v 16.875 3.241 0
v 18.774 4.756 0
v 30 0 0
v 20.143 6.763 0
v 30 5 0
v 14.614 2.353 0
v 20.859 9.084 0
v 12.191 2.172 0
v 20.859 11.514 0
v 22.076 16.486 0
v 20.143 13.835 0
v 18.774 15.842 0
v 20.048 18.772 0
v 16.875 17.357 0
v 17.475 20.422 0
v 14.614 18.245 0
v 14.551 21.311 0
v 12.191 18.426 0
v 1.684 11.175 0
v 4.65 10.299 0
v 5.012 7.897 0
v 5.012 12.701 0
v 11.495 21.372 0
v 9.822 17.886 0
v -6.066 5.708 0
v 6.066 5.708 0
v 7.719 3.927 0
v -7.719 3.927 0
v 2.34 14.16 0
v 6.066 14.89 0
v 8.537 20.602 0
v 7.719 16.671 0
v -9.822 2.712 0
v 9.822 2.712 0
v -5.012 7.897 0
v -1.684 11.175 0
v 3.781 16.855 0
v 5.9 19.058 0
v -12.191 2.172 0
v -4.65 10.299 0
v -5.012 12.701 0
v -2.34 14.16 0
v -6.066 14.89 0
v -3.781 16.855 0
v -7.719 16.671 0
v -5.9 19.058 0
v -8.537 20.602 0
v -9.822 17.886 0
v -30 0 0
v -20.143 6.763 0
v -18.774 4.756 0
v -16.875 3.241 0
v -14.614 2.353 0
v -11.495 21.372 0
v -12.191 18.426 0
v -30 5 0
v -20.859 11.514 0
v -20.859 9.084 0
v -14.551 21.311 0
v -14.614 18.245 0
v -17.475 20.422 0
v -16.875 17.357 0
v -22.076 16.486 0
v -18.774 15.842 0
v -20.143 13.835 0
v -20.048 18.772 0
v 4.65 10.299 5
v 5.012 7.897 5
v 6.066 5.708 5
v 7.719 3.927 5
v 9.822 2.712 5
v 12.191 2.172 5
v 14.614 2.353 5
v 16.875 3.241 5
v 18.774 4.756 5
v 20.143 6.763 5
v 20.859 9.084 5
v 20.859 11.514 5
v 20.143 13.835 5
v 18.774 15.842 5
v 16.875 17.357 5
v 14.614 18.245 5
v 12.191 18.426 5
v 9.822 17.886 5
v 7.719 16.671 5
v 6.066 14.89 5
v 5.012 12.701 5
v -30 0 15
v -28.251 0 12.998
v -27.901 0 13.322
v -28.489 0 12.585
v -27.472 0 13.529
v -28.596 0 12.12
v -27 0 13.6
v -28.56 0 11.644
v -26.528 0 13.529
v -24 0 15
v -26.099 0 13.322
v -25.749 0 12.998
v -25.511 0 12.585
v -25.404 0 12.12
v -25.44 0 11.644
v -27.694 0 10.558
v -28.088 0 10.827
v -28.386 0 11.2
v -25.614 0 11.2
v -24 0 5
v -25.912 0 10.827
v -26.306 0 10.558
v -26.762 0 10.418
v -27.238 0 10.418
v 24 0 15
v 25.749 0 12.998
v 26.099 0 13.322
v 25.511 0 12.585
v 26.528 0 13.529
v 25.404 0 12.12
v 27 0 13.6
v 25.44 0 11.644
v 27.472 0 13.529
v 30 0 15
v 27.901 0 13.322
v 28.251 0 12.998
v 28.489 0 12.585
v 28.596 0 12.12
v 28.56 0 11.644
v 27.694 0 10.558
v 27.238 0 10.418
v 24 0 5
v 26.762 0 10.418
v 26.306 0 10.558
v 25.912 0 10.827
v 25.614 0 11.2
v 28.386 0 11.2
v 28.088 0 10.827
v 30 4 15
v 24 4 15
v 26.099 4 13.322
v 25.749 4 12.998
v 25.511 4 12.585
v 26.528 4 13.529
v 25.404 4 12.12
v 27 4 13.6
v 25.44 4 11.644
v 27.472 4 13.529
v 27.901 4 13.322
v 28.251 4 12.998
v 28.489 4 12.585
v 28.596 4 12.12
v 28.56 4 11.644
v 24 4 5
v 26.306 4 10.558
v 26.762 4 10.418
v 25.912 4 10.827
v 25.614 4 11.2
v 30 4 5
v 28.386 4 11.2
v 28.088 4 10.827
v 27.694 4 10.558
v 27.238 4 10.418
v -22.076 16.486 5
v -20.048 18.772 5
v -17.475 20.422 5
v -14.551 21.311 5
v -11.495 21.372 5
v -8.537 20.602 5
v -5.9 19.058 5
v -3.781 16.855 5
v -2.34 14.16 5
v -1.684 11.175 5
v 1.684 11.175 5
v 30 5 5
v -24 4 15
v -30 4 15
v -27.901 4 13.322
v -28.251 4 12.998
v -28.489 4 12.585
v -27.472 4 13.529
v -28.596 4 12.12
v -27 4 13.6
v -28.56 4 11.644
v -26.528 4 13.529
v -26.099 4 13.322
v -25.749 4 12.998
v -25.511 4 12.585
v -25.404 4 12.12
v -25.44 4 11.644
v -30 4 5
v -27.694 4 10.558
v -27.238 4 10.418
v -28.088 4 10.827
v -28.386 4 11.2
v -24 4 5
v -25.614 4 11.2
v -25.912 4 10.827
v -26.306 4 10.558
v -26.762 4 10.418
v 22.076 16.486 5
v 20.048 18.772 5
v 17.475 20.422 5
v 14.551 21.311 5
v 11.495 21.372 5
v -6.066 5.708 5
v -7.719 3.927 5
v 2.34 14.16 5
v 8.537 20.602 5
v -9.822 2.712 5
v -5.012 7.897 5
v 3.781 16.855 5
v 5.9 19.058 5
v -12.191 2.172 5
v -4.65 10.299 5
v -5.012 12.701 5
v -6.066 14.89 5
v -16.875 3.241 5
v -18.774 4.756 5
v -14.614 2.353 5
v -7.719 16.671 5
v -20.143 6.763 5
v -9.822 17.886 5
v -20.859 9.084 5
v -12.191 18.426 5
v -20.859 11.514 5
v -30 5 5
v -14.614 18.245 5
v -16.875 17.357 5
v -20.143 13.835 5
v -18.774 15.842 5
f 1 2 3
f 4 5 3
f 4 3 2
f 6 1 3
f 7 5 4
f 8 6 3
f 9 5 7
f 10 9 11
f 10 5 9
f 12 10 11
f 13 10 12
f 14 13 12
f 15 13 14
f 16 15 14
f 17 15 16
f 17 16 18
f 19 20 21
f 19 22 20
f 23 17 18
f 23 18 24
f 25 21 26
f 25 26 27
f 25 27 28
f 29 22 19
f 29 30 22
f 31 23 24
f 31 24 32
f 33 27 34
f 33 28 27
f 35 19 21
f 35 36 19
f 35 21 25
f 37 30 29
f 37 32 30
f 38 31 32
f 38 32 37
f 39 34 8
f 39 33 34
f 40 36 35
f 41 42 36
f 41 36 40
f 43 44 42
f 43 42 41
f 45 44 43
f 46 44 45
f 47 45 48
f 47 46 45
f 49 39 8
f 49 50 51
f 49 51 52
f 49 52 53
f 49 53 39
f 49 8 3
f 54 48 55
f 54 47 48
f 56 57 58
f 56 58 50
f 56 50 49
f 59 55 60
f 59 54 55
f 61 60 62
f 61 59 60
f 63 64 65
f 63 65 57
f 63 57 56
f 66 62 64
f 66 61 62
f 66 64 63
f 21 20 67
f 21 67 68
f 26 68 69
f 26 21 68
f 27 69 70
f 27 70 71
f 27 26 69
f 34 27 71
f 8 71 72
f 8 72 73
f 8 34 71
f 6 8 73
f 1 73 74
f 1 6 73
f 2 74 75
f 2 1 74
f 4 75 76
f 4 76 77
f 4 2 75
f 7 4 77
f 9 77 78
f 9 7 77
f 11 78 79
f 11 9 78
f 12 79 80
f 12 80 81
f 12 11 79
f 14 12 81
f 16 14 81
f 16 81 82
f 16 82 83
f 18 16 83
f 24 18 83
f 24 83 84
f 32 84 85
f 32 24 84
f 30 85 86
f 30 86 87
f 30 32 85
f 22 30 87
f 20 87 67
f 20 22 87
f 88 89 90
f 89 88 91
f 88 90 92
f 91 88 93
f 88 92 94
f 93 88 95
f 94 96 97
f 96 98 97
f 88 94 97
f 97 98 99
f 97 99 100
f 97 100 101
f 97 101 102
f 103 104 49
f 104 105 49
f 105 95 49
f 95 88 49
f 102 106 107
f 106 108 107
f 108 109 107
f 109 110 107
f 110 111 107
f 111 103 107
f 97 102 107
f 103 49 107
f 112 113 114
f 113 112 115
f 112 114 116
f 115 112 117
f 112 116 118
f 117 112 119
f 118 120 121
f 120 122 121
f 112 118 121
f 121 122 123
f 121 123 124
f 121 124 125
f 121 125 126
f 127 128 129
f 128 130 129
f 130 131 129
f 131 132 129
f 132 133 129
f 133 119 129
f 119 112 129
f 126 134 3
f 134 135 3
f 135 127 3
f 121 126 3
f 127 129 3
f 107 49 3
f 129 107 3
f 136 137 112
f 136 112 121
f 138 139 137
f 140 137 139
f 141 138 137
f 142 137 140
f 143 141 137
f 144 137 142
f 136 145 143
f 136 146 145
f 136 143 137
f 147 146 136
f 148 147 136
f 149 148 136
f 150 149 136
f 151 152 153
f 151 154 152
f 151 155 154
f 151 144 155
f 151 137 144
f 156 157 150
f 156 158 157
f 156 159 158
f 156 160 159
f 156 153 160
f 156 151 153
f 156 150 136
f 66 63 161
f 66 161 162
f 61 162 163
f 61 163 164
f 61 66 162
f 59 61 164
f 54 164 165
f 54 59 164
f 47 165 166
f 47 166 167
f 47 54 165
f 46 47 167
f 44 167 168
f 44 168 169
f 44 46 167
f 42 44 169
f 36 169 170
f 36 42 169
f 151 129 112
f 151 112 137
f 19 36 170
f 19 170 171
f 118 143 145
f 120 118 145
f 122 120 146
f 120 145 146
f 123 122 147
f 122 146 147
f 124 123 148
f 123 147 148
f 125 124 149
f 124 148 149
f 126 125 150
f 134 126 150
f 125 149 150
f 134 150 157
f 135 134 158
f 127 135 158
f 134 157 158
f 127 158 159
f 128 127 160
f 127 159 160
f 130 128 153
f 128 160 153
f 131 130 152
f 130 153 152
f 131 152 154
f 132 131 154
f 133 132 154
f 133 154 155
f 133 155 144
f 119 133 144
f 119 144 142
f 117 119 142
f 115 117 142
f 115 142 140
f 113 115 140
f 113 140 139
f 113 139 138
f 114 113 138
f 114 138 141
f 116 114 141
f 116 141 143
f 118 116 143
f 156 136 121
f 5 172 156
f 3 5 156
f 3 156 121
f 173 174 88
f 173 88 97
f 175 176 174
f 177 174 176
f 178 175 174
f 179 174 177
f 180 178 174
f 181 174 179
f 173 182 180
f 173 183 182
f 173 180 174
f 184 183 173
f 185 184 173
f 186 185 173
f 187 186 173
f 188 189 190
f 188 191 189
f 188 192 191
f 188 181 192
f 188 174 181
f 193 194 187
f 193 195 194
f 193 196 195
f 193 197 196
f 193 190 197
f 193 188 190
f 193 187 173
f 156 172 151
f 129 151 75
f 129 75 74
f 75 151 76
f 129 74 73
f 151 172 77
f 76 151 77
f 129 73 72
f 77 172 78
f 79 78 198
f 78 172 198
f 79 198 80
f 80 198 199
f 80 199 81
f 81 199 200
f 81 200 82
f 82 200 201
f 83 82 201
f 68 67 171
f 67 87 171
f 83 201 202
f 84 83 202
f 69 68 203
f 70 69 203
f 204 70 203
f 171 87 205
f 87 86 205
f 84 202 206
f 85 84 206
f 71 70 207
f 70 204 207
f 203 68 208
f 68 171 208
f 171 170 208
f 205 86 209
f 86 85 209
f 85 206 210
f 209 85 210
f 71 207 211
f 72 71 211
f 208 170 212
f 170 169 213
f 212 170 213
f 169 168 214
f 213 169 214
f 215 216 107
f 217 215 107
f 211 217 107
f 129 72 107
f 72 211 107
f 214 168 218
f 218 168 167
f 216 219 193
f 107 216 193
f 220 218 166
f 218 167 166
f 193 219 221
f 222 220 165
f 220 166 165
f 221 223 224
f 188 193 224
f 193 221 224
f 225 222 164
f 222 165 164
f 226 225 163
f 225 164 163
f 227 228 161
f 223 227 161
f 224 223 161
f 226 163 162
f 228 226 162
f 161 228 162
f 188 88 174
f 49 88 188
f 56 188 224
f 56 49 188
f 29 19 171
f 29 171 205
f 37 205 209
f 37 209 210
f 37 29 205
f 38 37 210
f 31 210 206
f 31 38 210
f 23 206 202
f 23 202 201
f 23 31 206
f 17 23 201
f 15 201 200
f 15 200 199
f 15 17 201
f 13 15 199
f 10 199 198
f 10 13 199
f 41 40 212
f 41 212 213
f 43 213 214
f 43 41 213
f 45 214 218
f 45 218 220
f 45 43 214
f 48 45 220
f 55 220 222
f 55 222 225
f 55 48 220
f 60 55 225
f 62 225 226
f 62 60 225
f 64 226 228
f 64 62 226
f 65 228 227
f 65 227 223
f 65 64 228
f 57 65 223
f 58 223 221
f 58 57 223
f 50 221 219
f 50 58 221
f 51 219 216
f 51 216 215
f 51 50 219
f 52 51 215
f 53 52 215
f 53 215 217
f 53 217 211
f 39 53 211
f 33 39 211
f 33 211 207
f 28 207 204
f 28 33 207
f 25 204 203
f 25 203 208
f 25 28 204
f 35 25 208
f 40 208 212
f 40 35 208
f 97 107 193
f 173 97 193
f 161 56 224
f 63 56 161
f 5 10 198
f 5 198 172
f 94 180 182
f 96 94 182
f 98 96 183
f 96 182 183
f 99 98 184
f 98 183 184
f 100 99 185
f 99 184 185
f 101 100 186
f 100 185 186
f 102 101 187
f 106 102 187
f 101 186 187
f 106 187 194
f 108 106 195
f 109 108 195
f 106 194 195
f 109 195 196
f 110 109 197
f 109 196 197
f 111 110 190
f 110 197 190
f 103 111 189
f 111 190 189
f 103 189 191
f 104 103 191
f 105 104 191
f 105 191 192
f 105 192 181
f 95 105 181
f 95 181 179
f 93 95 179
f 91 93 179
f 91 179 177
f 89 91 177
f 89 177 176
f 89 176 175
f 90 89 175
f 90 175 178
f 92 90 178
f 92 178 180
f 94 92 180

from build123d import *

# Parameters (mm, degrees)
SKETCH1_R           = 8.15
BOSS_EXTRUDE1_DEPTH = 5
SKETCH3_W           = 6
SKETCH3_H           = 4
BOSS_EXTRUDE2_DEPTH = 10
SKETCH4_R           = 1.6
CUT_EXTRUDE1_DEPTH  = 10


with BuildPart() as part:
    # Sketch1 → Boss-Extrude1 (new body)
    with BuildSketch(Plane.XY):
        with BuildLine():
            Line((30, 0), (-30, 0))
            Line((-30, 0), (-30, 5))
            Line((-30, 5), (-22.076055104, 16.485922475))
            ThreePointArc((-22.076055104, 16.485922475), (-9.989658142, 21.089074765), (-1.684442299, 11.174772352))
            Line((-1.684442299, 11.174772352), (1.684442299, 11.174772352))
            ThreePointArc((1.684442299, 11.174772352), (9.989658142, 21.089074765), (22.076055104, 16.485922475))
            Line((22.076055104, 16.485922475), (30, 5))
            Line((30, 5), (30, 0))
        make_face()
        with Locations((-12.8, 10.299057219)):
            Circle(SKETCH1_R, mode=Mode.SUBTRACT)
        with Locations(Location((12.8, 10.299057219, 0), (0, 0, 180))):
            Circle(SKETCH1_R, mode=Mode.SUBTRACT)
    extrude(amount=BOSS_EXTRUDE1_DEPTH)

    # Sketch3 → Boss-Extrude2 (add)
    with BuildSketch(Plane.XY.offset(5)):
        with Locations((-27, 2)):
            Rectangle(SKETCH3_W, SKETCH3_H)
        with Locations((27, 2)):
            Rectangle(SKETCH3_W, SKETCH3_H)
    extrude(amount=BOSS_EXTRUDE2_DEPTH)

    # Sketch4 → Cut-Extrude1 (cut)
    with BuildSketch(Plane(origin=(0, 4, 0), x_dir=(1, 0, 0), z_dir=(0, 1, 0))):
        with Locations(Location((-27, -12, 0), (0, 0, 270))):
            Circle(SKETCH4_R)
        with Locations(Location((27, -12, 0), (0, 0, 270))):
            Circle(SKETCH4_R)
    extrude(amount=-CUT_EXTRUDE1_DEPTH, mode=Mode.SUBTRACT)


solid = part.part
